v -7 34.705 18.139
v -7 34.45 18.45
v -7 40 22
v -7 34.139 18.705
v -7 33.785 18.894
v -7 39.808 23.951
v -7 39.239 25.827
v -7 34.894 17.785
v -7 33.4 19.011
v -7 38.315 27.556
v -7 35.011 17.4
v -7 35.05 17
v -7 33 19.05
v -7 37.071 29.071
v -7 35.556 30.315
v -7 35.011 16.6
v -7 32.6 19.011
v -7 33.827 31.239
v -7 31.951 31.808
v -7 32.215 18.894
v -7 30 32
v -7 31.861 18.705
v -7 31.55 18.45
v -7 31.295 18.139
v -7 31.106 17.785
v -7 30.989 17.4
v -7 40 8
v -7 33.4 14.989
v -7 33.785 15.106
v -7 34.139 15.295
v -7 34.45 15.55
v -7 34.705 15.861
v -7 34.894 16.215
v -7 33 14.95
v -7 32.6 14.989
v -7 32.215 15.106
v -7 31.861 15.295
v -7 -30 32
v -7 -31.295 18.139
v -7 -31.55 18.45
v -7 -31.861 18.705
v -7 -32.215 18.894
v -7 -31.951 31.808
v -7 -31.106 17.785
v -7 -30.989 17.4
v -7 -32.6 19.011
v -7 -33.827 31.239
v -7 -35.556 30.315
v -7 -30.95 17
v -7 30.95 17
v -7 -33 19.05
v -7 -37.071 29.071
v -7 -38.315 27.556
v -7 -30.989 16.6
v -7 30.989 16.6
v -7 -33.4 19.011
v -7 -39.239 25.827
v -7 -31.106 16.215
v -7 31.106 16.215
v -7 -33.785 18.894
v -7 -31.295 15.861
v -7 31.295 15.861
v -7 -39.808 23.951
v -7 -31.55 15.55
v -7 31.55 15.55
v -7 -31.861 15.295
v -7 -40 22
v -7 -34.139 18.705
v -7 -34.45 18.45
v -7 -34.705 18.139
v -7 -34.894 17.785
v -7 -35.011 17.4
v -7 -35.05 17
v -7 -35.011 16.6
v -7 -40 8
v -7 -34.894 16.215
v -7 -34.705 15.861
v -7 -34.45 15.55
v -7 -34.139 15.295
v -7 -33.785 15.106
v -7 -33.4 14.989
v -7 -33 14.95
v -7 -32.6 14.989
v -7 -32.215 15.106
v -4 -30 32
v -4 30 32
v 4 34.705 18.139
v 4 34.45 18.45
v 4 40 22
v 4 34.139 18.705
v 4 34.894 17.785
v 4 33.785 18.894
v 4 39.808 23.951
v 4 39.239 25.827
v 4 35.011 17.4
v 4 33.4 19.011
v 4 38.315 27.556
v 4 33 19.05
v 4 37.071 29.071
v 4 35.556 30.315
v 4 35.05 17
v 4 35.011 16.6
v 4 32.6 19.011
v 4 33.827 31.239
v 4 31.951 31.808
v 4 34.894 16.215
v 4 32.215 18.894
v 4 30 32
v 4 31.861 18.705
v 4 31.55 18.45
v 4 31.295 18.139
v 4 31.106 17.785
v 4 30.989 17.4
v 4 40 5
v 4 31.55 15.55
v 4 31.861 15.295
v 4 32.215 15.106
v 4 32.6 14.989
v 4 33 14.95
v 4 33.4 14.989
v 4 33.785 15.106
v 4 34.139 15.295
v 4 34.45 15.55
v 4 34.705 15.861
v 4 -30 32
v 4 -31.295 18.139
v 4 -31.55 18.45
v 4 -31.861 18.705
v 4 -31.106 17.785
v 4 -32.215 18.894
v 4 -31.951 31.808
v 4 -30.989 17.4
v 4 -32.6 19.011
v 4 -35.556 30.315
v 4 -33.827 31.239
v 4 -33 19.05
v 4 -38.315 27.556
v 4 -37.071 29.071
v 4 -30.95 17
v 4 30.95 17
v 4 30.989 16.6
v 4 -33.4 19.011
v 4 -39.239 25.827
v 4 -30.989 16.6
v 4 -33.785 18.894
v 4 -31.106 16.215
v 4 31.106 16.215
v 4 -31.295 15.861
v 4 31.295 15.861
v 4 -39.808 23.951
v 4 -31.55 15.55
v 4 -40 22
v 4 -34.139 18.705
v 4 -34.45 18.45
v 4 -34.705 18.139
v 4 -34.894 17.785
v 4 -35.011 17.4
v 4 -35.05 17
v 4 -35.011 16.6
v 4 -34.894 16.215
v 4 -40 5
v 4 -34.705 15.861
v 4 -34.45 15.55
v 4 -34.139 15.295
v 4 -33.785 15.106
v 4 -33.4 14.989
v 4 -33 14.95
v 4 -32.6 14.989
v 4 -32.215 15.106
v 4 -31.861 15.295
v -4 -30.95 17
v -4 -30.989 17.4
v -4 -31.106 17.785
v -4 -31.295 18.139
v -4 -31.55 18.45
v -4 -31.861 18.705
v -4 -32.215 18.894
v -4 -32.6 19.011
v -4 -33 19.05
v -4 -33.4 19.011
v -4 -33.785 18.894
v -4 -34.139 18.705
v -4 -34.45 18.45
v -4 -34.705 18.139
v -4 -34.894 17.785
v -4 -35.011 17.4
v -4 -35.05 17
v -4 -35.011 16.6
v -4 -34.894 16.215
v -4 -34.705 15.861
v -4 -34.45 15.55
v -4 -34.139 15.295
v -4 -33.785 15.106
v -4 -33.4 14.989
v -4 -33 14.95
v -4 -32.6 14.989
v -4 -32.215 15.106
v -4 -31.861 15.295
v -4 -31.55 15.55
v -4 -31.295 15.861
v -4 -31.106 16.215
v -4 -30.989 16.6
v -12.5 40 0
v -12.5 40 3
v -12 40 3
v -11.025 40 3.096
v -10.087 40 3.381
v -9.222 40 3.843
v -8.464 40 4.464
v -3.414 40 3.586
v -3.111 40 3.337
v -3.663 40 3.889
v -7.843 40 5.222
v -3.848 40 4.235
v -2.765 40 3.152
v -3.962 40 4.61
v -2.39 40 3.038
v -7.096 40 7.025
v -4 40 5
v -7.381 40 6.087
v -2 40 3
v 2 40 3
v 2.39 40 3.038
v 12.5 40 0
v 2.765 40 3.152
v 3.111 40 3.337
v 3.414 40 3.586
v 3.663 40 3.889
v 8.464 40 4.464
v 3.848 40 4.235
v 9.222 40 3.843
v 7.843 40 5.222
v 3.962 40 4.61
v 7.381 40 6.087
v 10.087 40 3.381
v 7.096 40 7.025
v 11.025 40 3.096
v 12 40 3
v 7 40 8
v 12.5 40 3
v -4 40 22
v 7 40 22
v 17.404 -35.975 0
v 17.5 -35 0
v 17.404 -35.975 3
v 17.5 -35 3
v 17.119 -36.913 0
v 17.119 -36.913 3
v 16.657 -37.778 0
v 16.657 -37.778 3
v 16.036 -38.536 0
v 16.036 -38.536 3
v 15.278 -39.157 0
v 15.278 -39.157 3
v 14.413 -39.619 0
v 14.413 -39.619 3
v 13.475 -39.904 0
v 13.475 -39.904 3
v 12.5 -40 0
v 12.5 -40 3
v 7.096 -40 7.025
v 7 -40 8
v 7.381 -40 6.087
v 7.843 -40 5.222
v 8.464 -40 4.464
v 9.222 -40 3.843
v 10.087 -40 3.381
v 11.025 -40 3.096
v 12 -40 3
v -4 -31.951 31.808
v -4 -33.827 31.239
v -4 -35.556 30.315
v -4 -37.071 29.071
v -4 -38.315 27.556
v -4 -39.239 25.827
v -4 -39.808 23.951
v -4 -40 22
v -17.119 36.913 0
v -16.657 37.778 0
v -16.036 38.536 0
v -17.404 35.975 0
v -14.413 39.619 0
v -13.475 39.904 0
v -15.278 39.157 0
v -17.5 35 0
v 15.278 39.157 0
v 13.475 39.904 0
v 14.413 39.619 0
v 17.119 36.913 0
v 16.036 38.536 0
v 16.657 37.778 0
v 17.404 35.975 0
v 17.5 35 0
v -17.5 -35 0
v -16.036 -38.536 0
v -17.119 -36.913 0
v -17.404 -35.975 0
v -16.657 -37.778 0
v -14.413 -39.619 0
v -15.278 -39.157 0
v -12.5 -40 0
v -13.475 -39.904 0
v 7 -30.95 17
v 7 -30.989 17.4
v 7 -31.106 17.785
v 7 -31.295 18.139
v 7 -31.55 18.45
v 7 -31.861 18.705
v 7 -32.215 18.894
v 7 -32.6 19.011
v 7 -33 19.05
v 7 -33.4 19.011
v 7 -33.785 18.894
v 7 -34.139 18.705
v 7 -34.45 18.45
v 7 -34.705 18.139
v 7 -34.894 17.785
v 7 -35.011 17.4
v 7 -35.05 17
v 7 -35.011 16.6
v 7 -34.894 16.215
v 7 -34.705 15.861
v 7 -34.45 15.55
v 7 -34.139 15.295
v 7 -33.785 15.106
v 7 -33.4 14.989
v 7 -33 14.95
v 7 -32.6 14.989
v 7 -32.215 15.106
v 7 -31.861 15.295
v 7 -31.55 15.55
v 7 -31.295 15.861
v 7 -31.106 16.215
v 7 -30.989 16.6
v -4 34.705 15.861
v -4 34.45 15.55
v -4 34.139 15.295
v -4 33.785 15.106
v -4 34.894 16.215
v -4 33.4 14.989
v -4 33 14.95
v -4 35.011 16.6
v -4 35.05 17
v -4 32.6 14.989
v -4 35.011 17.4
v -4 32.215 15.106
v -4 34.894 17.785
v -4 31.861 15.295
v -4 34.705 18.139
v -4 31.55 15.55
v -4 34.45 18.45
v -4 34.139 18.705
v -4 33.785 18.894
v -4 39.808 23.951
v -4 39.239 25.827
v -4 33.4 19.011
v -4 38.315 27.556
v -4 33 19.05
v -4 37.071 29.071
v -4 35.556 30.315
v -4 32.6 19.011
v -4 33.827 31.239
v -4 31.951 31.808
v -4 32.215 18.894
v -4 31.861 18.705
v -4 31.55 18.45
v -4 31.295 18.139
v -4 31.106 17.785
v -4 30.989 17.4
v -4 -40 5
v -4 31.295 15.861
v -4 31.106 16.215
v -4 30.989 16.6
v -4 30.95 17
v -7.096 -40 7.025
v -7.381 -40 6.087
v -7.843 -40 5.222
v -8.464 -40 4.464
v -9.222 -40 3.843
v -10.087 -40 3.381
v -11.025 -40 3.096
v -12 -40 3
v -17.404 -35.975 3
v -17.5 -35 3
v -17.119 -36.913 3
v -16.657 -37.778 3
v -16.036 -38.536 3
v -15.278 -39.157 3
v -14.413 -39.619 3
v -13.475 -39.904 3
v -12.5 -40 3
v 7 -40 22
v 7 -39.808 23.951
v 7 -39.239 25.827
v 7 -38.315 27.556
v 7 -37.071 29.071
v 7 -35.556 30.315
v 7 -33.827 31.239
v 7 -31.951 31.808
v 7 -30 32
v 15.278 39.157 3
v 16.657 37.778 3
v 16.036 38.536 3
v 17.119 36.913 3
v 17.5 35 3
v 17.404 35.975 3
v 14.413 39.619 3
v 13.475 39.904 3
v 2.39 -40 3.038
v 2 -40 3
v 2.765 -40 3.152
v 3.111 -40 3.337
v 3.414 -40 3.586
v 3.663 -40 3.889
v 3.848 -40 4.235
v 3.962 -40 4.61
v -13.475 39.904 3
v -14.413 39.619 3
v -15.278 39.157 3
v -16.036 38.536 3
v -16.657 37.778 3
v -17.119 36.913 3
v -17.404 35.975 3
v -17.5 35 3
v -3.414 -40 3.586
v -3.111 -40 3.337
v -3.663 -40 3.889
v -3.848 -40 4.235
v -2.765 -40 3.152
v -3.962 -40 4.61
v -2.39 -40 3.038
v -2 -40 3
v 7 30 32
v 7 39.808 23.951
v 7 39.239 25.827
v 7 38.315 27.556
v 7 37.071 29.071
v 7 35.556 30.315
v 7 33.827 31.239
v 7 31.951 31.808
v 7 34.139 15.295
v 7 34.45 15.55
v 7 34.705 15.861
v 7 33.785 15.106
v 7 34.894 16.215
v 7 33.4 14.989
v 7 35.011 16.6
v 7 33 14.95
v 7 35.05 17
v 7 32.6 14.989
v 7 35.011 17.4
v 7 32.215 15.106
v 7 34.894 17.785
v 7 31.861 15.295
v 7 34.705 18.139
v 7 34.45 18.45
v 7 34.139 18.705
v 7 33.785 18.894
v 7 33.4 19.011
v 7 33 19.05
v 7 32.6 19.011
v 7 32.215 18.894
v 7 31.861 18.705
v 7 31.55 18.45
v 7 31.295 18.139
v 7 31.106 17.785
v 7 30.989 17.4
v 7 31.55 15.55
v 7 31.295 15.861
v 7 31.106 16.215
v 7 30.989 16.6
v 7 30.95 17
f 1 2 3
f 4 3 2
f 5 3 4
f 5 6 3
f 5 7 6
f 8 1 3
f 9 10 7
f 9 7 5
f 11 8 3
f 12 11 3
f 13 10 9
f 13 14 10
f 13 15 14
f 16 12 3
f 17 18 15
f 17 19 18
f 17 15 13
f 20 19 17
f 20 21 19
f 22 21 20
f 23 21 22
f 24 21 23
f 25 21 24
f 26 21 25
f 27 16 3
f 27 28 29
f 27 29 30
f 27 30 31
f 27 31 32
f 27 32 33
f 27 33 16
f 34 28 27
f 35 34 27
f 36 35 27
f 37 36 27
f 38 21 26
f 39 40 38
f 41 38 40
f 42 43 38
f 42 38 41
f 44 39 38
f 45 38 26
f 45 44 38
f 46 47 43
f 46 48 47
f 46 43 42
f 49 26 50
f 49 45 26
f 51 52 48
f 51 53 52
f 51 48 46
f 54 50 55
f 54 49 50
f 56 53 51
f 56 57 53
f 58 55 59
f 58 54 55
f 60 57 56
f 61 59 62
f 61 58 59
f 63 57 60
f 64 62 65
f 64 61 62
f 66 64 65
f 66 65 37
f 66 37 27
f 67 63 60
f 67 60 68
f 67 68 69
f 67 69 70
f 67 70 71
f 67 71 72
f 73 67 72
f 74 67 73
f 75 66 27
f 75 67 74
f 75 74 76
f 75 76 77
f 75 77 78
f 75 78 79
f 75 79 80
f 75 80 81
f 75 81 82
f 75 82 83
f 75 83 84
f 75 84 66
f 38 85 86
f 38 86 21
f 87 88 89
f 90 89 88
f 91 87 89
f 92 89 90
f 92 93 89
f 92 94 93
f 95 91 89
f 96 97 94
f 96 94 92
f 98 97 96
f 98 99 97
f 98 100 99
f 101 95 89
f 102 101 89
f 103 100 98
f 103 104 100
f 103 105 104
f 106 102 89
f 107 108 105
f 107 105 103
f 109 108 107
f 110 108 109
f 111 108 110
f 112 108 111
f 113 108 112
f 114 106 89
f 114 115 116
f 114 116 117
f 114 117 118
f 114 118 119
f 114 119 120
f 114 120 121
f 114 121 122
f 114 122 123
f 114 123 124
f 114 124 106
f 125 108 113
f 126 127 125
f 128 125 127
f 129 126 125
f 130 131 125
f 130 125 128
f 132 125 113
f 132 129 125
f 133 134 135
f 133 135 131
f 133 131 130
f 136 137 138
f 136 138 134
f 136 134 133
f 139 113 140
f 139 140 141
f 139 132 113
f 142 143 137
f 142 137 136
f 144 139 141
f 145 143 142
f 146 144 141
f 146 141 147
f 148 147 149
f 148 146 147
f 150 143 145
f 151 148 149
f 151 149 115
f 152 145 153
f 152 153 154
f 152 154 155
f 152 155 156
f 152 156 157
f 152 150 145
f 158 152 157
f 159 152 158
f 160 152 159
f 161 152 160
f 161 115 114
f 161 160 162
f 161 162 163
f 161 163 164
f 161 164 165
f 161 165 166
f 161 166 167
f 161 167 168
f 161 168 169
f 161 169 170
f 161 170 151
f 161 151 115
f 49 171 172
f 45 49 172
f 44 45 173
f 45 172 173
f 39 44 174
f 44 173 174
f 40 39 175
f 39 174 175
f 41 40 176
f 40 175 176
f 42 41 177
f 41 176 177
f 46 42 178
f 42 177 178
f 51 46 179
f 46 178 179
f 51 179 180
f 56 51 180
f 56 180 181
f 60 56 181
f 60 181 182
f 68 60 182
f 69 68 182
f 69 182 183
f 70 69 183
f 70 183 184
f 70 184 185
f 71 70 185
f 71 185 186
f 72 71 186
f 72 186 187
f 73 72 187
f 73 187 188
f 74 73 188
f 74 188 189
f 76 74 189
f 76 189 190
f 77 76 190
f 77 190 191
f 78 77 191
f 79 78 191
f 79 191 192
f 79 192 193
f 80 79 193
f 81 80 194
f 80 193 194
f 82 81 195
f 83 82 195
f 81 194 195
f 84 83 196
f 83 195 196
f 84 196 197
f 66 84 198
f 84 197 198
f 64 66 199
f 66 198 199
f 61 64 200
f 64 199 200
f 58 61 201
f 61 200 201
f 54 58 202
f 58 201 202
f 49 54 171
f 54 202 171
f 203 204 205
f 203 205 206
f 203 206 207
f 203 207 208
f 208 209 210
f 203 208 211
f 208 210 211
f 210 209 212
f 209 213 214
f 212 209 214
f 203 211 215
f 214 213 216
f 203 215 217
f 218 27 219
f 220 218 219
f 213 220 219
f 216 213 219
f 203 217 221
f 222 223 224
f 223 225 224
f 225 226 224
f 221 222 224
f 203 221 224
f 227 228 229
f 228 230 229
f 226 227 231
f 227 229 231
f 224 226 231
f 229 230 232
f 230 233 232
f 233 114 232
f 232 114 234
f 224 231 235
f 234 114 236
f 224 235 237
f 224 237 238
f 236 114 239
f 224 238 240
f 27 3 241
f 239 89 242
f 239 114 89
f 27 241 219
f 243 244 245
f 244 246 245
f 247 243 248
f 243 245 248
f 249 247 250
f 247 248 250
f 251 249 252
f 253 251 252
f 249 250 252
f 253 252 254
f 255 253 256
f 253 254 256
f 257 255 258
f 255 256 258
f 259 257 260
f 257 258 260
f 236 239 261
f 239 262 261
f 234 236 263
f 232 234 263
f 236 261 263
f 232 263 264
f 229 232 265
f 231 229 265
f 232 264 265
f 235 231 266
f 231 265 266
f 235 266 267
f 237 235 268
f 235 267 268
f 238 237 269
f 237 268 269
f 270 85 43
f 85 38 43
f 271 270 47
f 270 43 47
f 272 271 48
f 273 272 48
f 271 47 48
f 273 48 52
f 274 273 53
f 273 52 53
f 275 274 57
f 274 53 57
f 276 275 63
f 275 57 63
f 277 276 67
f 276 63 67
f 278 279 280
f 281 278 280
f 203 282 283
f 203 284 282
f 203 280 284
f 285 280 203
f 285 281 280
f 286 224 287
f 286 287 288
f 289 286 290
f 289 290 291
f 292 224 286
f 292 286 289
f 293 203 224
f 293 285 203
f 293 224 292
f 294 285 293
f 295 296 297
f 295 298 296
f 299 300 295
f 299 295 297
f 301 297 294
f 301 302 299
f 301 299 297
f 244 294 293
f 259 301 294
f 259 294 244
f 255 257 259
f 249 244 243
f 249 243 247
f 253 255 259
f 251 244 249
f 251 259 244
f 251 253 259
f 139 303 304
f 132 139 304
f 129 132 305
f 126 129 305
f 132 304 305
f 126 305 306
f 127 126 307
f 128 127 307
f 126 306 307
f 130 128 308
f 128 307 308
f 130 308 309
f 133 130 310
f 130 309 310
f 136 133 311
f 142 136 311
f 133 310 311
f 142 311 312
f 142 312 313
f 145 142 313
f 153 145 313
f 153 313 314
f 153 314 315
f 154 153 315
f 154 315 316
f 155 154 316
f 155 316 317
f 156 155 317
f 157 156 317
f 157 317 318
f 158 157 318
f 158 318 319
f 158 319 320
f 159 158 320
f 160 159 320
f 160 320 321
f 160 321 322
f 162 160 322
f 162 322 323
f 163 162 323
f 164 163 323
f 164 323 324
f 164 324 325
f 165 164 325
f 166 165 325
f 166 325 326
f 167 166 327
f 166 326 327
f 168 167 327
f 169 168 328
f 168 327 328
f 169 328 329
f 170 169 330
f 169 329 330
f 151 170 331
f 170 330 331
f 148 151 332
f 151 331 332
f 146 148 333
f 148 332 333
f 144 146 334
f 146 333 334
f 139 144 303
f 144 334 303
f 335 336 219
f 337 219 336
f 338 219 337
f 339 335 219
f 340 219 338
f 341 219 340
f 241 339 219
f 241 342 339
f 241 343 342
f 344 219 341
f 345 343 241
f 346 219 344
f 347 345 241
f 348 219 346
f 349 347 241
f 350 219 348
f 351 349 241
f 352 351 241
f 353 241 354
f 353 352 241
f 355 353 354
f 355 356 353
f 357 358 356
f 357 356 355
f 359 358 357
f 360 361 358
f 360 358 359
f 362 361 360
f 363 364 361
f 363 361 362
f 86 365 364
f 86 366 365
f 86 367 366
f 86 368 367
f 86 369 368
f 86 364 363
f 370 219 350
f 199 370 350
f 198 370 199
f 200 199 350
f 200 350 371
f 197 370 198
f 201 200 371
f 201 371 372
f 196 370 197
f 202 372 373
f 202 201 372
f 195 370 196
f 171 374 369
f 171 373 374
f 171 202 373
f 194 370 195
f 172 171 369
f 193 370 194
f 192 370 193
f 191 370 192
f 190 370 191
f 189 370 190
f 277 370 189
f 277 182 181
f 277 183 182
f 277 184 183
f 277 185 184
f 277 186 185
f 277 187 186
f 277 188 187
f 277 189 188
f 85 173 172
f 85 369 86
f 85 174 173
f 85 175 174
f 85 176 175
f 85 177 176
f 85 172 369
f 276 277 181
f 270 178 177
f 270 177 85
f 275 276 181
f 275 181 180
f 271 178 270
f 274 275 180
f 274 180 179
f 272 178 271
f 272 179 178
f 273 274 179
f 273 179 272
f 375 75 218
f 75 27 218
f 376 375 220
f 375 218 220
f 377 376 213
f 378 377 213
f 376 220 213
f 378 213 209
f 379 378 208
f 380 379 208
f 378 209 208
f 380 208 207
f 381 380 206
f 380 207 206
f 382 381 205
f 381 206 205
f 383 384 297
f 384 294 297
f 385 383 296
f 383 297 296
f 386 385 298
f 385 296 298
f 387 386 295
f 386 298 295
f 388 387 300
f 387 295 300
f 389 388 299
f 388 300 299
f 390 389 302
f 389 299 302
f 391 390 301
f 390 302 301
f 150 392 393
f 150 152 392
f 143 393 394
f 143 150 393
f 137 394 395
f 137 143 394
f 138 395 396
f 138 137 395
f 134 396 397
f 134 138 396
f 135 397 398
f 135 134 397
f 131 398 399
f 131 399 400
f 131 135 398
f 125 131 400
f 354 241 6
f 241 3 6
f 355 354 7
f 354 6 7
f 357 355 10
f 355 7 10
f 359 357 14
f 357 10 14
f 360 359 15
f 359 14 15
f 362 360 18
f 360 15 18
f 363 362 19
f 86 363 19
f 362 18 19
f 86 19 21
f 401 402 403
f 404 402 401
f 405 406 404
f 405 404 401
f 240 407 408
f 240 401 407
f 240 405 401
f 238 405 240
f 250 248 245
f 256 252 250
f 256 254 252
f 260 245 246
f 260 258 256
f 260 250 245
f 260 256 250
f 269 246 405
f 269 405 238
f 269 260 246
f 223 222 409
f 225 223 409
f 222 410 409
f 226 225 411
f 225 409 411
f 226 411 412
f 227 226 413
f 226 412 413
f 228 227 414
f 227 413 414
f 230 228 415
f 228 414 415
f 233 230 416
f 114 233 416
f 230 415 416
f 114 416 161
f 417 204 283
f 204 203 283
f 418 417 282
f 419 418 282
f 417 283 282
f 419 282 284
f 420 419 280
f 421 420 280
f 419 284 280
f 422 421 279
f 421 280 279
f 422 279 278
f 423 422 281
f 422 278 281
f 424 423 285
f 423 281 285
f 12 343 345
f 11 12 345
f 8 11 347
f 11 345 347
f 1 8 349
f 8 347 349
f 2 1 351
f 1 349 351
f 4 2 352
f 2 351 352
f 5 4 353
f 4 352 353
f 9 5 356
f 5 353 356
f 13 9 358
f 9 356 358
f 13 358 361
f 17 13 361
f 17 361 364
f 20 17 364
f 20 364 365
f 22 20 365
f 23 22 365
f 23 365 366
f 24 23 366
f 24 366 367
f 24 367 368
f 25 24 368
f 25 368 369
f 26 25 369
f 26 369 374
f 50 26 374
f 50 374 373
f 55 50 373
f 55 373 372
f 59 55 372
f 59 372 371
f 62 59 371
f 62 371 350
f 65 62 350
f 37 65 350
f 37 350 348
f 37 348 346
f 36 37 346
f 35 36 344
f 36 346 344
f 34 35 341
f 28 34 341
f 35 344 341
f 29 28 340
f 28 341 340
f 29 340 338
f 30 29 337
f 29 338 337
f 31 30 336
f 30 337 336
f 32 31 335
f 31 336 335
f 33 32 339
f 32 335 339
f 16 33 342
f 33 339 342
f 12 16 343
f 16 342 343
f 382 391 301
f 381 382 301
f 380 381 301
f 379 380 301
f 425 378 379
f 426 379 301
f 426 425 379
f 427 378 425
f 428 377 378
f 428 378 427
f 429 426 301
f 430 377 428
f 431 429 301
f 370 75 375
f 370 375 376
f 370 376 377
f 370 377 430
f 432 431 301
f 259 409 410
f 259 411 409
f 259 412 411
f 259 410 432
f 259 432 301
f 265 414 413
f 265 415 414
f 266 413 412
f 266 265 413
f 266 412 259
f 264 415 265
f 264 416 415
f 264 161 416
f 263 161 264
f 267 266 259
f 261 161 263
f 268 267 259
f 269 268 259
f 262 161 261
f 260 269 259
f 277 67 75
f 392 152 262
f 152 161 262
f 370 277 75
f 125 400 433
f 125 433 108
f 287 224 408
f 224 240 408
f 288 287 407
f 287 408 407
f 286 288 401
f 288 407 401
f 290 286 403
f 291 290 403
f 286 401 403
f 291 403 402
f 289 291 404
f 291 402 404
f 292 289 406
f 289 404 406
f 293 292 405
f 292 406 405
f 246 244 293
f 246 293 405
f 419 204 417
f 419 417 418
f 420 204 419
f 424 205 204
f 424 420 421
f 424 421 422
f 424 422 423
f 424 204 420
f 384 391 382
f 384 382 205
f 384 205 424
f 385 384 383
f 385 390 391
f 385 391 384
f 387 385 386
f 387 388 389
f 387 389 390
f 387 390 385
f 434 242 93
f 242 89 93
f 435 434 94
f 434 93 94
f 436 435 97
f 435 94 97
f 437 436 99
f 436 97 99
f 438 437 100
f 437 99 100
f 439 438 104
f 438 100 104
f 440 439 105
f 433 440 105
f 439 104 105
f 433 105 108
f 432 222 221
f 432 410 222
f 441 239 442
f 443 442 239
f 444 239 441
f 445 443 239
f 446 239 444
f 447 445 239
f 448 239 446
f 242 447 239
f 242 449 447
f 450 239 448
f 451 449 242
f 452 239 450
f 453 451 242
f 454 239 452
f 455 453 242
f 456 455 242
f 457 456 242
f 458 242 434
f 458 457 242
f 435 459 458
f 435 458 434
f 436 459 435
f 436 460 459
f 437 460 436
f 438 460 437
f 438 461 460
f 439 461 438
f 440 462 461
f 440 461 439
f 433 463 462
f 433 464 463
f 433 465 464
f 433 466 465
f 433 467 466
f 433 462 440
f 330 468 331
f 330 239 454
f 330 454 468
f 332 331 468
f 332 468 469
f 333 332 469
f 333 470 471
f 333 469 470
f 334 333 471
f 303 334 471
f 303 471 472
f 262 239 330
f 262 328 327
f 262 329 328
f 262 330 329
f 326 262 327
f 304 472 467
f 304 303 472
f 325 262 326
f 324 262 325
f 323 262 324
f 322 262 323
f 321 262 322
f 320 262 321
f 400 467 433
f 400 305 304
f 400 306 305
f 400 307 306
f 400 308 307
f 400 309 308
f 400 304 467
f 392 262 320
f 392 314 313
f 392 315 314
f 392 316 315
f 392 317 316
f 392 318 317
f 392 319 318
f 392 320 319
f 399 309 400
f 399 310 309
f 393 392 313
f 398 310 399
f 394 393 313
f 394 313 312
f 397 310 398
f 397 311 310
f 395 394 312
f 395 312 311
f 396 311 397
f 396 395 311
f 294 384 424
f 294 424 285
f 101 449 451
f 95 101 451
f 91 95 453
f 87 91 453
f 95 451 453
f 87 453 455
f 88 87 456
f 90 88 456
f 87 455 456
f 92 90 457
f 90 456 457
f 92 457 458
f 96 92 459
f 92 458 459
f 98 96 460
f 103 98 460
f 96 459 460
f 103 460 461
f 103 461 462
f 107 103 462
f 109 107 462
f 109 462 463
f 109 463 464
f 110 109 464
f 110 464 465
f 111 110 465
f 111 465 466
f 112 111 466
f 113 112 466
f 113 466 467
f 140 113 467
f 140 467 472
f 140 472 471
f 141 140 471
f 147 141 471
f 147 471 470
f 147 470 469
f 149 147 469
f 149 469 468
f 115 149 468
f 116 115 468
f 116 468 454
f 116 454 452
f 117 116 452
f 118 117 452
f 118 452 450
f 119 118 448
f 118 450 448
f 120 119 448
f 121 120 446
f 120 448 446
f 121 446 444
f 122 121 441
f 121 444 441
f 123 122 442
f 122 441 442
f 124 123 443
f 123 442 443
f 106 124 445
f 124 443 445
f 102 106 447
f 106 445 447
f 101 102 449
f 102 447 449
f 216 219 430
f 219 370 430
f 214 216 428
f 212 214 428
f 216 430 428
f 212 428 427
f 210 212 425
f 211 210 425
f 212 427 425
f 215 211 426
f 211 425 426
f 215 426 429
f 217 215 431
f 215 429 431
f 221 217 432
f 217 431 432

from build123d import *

# Parameters (mm, degrees)
F1_DEPTH = 40
F2_R     = 2
F3_R     = 10
F4_R     = 2.05
F5_DEPTH = 14
F6_R     = 5
F7_R     = 5


with BuildPart() as f1:
    # F0 (on Front) → F1 (new body, symmetric)
    with BuildSketch(Plane.XZ):
        Polygon((-17.5, 3), (-17.5, 0), (17.5, 0), (17.5, 3), (7, 3), (7, 32), (4, 32), (4, 3), (-4, 3), (-4, 32), (-7, 32), (-7, 3), align=None)
    extrude(amount=F1_DEPTH, both=True)

    # F2
    f2_edges = [f1.edges().sort_by_distance(p)[0] for p in [
        (-4, 0, 3),
        (4, 0, 3),
    ]]
    fillet(f2_edges, radius=F2_R)

    # F3
    f3_edges = [f1.edges().sort_by_distance(p)[0] for p in [
        (5.5, 40, 32),
        (-5.5, 40, 32),
        (5.5, -40, 32),
        (-5.5, -40, 32),
    ]]
    fillet(f3_edges, radius=F3_R)

    # F4 (on face) → F5 (cut, through all)
    with BuildSketch(Plane.YZ.offset(7)):
        with Locations((-33, 17)):
            Circle(F4_R)
        with Locations((33, 17)):
            Circle(F4_R)
    extrude(amount=-F5_DEPTH, mode=Mode.SUBTRACT)

    # F6
    f6_edges = [f1.edges().sort_by_distance(p)[0] for p in [
        (7, 0, 3),
        (-7, 0, 3),
    ]]
    fillet(f6_edges, radius=F6_R)

    # F7
    f7_edges = [f1.edges().sort_by_distance(p)[0] for p in [
        (-17.5, -40, 1.5),
        (17.5, -40, 1.5),
        (17.5, 40, 1.5),
        (-17.5, 40, 1.5),
    ]]
    fillet(f7_edges, radius=F7_R)


solid = f1.part
